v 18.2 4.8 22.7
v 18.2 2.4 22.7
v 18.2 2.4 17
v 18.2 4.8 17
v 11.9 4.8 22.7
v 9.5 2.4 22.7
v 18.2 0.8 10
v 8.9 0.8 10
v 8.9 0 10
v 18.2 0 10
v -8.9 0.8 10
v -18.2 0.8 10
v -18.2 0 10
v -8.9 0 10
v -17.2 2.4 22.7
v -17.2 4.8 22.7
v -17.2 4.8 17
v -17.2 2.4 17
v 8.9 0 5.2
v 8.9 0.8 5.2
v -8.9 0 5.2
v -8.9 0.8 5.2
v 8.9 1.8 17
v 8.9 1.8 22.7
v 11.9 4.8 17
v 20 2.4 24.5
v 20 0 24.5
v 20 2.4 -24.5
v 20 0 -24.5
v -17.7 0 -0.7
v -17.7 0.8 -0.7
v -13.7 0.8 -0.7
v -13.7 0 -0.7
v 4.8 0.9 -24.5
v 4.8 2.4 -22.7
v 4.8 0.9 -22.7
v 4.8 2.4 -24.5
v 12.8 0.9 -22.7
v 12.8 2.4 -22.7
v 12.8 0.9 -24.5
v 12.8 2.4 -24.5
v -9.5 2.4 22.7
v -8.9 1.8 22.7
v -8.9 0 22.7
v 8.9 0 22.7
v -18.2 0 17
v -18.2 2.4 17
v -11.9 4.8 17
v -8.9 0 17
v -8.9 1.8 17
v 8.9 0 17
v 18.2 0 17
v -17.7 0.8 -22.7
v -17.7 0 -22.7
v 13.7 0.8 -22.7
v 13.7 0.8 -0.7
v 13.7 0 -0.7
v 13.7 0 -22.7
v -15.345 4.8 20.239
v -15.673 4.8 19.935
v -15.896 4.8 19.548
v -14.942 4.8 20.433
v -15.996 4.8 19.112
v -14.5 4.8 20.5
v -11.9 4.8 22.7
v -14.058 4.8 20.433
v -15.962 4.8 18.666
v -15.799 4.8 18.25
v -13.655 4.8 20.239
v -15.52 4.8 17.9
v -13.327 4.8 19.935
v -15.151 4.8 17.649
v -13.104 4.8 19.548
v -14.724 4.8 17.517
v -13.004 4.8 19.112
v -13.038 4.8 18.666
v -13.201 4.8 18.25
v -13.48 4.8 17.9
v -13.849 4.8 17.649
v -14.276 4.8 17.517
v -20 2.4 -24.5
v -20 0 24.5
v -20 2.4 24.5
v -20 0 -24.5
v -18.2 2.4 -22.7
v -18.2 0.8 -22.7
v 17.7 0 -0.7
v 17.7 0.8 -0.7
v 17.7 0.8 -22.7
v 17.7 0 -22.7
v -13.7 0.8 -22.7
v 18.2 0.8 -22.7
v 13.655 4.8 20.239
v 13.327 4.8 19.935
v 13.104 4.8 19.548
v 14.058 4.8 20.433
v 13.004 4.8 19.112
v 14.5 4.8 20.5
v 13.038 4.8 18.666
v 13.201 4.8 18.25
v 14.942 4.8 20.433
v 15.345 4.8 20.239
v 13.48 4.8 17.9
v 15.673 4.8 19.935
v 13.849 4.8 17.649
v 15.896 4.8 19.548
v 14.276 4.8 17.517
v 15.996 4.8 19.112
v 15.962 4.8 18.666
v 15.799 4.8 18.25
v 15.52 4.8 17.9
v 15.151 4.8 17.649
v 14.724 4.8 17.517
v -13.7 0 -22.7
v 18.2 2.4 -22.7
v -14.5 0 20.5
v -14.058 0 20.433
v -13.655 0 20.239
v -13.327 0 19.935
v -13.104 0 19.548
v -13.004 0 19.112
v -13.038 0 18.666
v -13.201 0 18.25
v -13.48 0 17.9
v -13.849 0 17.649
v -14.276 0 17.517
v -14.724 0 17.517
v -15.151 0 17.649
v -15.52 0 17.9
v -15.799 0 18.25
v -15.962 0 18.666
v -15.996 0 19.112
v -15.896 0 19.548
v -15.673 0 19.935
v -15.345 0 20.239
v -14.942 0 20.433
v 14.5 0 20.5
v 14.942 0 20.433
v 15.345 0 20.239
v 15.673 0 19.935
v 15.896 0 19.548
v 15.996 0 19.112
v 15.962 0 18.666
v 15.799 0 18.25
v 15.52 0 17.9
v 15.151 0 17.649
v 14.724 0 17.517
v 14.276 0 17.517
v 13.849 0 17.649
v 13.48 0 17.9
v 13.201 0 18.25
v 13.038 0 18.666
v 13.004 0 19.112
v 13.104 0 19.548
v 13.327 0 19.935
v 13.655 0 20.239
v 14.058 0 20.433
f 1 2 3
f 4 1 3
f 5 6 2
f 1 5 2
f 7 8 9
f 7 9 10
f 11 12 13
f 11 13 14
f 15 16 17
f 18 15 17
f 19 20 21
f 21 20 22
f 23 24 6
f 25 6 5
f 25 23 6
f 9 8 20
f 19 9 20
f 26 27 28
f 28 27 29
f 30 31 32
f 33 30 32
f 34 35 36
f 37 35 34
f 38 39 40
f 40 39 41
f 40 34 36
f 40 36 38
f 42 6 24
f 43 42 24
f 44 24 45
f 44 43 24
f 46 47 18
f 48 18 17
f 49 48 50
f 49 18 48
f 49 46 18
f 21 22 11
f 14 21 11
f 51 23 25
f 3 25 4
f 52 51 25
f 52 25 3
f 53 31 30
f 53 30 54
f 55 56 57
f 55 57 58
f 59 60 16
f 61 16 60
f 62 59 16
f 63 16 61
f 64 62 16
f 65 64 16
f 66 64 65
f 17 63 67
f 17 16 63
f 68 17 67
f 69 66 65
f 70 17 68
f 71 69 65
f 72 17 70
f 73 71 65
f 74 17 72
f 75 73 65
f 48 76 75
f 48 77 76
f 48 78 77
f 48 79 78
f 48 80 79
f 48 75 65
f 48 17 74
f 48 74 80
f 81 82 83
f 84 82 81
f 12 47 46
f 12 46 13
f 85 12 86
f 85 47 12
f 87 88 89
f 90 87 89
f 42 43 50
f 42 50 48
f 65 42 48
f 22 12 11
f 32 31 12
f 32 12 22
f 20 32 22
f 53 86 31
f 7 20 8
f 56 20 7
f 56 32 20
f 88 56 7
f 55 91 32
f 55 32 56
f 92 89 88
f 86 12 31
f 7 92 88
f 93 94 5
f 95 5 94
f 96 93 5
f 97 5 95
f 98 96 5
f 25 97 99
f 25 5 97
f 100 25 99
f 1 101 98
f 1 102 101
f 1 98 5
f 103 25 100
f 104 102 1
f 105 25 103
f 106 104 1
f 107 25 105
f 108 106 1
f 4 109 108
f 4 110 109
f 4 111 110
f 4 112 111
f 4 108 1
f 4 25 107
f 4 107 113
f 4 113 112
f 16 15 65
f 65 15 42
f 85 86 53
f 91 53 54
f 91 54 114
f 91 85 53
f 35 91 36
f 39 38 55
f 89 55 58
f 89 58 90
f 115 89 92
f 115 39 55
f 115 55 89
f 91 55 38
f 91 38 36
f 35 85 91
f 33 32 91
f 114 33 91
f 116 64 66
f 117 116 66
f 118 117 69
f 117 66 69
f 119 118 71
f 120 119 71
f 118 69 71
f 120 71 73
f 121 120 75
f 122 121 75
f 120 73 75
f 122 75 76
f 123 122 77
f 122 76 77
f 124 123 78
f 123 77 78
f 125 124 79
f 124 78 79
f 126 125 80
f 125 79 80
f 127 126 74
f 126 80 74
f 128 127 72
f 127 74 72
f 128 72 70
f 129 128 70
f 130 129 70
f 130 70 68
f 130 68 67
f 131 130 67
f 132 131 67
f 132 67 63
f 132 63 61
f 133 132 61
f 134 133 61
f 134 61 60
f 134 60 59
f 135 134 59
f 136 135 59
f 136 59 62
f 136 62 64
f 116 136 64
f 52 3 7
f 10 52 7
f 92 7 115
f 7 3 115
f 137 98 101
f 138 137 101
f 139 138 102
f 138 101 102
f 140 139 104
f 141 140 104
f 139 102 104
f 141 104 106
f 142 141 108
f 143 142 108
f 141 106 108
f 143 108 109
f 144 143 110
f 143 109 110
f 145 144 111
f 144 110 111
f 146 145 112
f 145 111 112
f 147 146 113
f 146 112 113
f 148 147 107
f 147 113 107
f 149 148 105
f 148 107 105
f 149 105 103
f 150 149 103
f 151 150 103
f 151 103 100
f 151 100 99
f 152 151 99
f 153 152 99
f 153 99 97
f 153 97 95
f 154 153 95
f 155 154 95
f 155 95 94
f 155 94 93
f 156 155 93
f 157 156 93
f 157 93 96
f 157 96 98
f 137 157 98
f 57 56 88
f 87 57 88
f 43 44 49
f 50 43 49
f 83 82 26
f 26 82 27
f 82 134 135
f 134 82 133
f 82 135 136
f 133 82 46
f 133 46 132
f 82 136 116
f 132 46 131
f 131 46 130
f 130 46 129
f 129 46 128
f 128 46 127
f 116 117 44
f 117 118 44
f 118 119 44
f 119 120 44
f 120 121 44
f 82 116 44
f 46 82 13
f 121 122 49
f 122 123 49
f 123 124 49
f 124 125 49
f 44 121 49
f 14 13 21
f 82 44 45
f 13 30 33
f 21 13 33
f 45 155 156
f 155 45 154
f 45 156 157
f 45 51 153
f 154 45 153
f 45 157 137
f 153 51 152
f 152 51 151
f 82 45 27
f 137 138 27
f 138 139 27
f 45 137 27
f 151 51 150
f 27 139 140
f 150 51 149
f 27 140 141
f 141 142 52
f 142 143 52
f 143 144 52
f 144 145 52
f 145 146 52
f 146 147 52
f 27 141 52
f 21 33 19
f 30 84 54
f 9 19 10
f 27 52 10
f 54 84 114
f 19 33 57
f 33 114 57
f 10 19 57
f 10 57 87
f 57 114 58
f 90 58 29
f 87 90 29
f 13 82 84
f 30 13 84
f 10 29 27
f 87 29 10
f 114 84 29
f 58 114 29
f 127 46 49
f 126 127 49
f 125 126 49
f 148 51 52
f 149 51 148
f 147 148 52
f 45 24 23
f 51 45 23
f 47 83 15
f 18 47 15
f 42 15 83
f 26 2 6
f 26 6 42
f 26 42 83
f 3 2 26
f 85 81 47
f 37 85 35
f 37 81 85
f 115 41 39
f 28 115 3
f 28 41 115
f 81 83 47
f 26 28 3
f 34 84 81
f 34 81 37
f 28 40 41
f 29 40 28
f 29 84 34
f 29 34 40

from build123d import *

# Parameters (mm, degrees)
SKETCH1_W           = 40
SKETCH1_H           = 49
BOSS_EXTRUDE1_DEPTH = 2.4
SKETCH2_W           = 36.4
SKETCH2_H           = 45.4
CUT_EXTRUDE1_DEPTH  = 1.6
SKETCH3_W           = 9.3
SKETCH3_H           = 7
SKETCH3_W_2         = 4
SKETCH3_H_2         = 22
CUT_EXTRUDE2_DEPTH  = 1.6
SKETCH4_W           = 9.3
SKETCH4_H           = 5.7
BOSS_EXTRUDE2_DEPTH = 4
SKETCH5_R           = 1.5
CUT_EXTRUDE3_DEPTH  = 5
CHAMFER1_SIZE       = 3
SKETCH6_W           = 8
SKETCH6_H           = 1.8
CUT_EXTRUDE4_DEPTH  = 1.5
SKETCH7_W           = 1
SKETCH7_H           = 5.7
CUT_EXTRUDE5_DEPTH  = 2.4


with BuildPart() as part:
    # Sketch1 → Boss-Extrude1 (new body)
    with BuildSketch(Plane(origin=(0, 0, 0), x_dir=(1, 0, 0), z_dir=(0, 1, 0))):
        Rectangle(SKETCH1_W, SKETCH1_H)
    extrude(amount=BOSS_EXTRUDE1_DEPTH)

    # Sketch2 → Cut-Extrude1 (cut)
    with BuildSketch(Plane(origin=(0, 2.4, 0), x_dir=(1, 0, 0), z_dir=(0, 1, 0))):
        Rectangle(SKETCH2_W, SKETCH2_H)
    extrude(amount=-CUT_EXTRUDE1_DEPTH, mode=Mode.SUBTRACT)

    # Sketch3 → Cut-Extrude2 (cut)
    with BuildSketch(Plane(origin=(0, 0.8, 0), x_dir=(1, 0, 0), z_dir=(0, 1, 0))):
        with Locations((-13.55, -13.5)):
            Rectangle(SKETCH3_W, SKETCH3_H)
        Polygon((8.9, -5.2), (-8.9, -5.2), (-8.9, -10), (-8.9, -17), (-8.9, -22.7), (8.9, -22.7), (8.9, -17), (8.9, -10), align=None)
        with Locations((13.55, -13.5)):
            Rectangle(SKETCH3_W, SKETCH3_H)
        with Locations((15.7, 11.7)):
            Rectangle(SKETCH3_W_2, SKETCH3_H_2)
        with Locations((-15.7, 11.7)):
            Rectangle(SKETCH3_W_2, SKETCH3_H_2)
    extrude(amount=-CUT_EXTRUDE2_DEPTH, mode=Mode.SUBTRACT)

    # Sketch4 → Boss-Extrude2 (add)
    with BuildSketch(Plane(origin=(0, 0.8, 0), x_dir=(1, 0, 0), z_dir=(0, 1, 0))):
        with Locations((-13.55, -19.85)):
            Rectangle(SKETCH4_W, SKETCH4_H)
        with Locations((13.55, -19.85)):
            Rectangle(SKETCH4_W, SKETCH4_H)
    extrude(amount=BOSS_EXTRUDE2_DEPTH)

    # Sketch5 → Cut-Extrude3 (cut)
    with BuildSketch(Plane(origin=(0, 4.8, 0), x_dir=(1, 0, 0), z_dir=(0, 1, 0))):
        with Locations(Location((-14.5, -19, 0), (0, 0, 270))):
            Circle(SKETCH5_R)
        with Locations(Location((14.5, -19, 0), (0, 0, 270))):
            Circle(SKETCH5_R)
    extrude(amount=-CUT_EXTRUDE3_DEPTH, mode=Mode.SUBTRACT)

    # Chamfer1
    # the kernel refuses this chamfer: 3 mm, written as the material it takes off along each edge
    with BuildSketch(Plane(origin=(-8.9, 4.8, 22.7), x_dir=(0.02749587661058793, -0.9996219169112968, 0), z_dir=(0, 0, -1)), Plane(origin=(8.9, 4.8, 9.284951036), x_dir=(-0.027495876610586202, -0.9996219169112968, 0), z_dir=(0, 0, 1))) as chamfer1_piece_1:
        Polygon((CHAMFER1_SIZE * 0.999621916911, CHAMFER1_SIZE * 0.0274958766106), (-CHAMFER1_SIZE * 0.0274958766106, CHAMFER1_SIZE * 0.999621916911), (0, 0), align=None)
    extrude(amount=13.415048964, mode=Mode.SUBTRACT)

    # Sketch6 → Cut-Extrude4 (cut)
    with BuildSketch(Plane(origin=(0, 2.4, 0), x_dir=(1, 0, 0), z_dir=(0, 1, 0))):
        with Locations((8.8, 23.6)):
            Rectangle(SKETCH6_W, SKETCH6_H)
    extrude(amount=-CUT_EXTRUDE4_DEPTH, mode=Mode.SUBTRACT)

    # Sketch7 → Cut-Extrude5 (cut)
    with BuildSketch(Plane(origin=(0, 4.8, 0), x_dir=(1, 0, 0), z_dir=(0, 1, 0))):
        with Locations((-17.7, -19.85)):
            Rectangle(SKETCH7_W, SKETCH7_H)
    extrude(amount=-CUT_EXTRUDE5_DEPTH, mode=Mode.SUBTRACT)


solid = part.part
